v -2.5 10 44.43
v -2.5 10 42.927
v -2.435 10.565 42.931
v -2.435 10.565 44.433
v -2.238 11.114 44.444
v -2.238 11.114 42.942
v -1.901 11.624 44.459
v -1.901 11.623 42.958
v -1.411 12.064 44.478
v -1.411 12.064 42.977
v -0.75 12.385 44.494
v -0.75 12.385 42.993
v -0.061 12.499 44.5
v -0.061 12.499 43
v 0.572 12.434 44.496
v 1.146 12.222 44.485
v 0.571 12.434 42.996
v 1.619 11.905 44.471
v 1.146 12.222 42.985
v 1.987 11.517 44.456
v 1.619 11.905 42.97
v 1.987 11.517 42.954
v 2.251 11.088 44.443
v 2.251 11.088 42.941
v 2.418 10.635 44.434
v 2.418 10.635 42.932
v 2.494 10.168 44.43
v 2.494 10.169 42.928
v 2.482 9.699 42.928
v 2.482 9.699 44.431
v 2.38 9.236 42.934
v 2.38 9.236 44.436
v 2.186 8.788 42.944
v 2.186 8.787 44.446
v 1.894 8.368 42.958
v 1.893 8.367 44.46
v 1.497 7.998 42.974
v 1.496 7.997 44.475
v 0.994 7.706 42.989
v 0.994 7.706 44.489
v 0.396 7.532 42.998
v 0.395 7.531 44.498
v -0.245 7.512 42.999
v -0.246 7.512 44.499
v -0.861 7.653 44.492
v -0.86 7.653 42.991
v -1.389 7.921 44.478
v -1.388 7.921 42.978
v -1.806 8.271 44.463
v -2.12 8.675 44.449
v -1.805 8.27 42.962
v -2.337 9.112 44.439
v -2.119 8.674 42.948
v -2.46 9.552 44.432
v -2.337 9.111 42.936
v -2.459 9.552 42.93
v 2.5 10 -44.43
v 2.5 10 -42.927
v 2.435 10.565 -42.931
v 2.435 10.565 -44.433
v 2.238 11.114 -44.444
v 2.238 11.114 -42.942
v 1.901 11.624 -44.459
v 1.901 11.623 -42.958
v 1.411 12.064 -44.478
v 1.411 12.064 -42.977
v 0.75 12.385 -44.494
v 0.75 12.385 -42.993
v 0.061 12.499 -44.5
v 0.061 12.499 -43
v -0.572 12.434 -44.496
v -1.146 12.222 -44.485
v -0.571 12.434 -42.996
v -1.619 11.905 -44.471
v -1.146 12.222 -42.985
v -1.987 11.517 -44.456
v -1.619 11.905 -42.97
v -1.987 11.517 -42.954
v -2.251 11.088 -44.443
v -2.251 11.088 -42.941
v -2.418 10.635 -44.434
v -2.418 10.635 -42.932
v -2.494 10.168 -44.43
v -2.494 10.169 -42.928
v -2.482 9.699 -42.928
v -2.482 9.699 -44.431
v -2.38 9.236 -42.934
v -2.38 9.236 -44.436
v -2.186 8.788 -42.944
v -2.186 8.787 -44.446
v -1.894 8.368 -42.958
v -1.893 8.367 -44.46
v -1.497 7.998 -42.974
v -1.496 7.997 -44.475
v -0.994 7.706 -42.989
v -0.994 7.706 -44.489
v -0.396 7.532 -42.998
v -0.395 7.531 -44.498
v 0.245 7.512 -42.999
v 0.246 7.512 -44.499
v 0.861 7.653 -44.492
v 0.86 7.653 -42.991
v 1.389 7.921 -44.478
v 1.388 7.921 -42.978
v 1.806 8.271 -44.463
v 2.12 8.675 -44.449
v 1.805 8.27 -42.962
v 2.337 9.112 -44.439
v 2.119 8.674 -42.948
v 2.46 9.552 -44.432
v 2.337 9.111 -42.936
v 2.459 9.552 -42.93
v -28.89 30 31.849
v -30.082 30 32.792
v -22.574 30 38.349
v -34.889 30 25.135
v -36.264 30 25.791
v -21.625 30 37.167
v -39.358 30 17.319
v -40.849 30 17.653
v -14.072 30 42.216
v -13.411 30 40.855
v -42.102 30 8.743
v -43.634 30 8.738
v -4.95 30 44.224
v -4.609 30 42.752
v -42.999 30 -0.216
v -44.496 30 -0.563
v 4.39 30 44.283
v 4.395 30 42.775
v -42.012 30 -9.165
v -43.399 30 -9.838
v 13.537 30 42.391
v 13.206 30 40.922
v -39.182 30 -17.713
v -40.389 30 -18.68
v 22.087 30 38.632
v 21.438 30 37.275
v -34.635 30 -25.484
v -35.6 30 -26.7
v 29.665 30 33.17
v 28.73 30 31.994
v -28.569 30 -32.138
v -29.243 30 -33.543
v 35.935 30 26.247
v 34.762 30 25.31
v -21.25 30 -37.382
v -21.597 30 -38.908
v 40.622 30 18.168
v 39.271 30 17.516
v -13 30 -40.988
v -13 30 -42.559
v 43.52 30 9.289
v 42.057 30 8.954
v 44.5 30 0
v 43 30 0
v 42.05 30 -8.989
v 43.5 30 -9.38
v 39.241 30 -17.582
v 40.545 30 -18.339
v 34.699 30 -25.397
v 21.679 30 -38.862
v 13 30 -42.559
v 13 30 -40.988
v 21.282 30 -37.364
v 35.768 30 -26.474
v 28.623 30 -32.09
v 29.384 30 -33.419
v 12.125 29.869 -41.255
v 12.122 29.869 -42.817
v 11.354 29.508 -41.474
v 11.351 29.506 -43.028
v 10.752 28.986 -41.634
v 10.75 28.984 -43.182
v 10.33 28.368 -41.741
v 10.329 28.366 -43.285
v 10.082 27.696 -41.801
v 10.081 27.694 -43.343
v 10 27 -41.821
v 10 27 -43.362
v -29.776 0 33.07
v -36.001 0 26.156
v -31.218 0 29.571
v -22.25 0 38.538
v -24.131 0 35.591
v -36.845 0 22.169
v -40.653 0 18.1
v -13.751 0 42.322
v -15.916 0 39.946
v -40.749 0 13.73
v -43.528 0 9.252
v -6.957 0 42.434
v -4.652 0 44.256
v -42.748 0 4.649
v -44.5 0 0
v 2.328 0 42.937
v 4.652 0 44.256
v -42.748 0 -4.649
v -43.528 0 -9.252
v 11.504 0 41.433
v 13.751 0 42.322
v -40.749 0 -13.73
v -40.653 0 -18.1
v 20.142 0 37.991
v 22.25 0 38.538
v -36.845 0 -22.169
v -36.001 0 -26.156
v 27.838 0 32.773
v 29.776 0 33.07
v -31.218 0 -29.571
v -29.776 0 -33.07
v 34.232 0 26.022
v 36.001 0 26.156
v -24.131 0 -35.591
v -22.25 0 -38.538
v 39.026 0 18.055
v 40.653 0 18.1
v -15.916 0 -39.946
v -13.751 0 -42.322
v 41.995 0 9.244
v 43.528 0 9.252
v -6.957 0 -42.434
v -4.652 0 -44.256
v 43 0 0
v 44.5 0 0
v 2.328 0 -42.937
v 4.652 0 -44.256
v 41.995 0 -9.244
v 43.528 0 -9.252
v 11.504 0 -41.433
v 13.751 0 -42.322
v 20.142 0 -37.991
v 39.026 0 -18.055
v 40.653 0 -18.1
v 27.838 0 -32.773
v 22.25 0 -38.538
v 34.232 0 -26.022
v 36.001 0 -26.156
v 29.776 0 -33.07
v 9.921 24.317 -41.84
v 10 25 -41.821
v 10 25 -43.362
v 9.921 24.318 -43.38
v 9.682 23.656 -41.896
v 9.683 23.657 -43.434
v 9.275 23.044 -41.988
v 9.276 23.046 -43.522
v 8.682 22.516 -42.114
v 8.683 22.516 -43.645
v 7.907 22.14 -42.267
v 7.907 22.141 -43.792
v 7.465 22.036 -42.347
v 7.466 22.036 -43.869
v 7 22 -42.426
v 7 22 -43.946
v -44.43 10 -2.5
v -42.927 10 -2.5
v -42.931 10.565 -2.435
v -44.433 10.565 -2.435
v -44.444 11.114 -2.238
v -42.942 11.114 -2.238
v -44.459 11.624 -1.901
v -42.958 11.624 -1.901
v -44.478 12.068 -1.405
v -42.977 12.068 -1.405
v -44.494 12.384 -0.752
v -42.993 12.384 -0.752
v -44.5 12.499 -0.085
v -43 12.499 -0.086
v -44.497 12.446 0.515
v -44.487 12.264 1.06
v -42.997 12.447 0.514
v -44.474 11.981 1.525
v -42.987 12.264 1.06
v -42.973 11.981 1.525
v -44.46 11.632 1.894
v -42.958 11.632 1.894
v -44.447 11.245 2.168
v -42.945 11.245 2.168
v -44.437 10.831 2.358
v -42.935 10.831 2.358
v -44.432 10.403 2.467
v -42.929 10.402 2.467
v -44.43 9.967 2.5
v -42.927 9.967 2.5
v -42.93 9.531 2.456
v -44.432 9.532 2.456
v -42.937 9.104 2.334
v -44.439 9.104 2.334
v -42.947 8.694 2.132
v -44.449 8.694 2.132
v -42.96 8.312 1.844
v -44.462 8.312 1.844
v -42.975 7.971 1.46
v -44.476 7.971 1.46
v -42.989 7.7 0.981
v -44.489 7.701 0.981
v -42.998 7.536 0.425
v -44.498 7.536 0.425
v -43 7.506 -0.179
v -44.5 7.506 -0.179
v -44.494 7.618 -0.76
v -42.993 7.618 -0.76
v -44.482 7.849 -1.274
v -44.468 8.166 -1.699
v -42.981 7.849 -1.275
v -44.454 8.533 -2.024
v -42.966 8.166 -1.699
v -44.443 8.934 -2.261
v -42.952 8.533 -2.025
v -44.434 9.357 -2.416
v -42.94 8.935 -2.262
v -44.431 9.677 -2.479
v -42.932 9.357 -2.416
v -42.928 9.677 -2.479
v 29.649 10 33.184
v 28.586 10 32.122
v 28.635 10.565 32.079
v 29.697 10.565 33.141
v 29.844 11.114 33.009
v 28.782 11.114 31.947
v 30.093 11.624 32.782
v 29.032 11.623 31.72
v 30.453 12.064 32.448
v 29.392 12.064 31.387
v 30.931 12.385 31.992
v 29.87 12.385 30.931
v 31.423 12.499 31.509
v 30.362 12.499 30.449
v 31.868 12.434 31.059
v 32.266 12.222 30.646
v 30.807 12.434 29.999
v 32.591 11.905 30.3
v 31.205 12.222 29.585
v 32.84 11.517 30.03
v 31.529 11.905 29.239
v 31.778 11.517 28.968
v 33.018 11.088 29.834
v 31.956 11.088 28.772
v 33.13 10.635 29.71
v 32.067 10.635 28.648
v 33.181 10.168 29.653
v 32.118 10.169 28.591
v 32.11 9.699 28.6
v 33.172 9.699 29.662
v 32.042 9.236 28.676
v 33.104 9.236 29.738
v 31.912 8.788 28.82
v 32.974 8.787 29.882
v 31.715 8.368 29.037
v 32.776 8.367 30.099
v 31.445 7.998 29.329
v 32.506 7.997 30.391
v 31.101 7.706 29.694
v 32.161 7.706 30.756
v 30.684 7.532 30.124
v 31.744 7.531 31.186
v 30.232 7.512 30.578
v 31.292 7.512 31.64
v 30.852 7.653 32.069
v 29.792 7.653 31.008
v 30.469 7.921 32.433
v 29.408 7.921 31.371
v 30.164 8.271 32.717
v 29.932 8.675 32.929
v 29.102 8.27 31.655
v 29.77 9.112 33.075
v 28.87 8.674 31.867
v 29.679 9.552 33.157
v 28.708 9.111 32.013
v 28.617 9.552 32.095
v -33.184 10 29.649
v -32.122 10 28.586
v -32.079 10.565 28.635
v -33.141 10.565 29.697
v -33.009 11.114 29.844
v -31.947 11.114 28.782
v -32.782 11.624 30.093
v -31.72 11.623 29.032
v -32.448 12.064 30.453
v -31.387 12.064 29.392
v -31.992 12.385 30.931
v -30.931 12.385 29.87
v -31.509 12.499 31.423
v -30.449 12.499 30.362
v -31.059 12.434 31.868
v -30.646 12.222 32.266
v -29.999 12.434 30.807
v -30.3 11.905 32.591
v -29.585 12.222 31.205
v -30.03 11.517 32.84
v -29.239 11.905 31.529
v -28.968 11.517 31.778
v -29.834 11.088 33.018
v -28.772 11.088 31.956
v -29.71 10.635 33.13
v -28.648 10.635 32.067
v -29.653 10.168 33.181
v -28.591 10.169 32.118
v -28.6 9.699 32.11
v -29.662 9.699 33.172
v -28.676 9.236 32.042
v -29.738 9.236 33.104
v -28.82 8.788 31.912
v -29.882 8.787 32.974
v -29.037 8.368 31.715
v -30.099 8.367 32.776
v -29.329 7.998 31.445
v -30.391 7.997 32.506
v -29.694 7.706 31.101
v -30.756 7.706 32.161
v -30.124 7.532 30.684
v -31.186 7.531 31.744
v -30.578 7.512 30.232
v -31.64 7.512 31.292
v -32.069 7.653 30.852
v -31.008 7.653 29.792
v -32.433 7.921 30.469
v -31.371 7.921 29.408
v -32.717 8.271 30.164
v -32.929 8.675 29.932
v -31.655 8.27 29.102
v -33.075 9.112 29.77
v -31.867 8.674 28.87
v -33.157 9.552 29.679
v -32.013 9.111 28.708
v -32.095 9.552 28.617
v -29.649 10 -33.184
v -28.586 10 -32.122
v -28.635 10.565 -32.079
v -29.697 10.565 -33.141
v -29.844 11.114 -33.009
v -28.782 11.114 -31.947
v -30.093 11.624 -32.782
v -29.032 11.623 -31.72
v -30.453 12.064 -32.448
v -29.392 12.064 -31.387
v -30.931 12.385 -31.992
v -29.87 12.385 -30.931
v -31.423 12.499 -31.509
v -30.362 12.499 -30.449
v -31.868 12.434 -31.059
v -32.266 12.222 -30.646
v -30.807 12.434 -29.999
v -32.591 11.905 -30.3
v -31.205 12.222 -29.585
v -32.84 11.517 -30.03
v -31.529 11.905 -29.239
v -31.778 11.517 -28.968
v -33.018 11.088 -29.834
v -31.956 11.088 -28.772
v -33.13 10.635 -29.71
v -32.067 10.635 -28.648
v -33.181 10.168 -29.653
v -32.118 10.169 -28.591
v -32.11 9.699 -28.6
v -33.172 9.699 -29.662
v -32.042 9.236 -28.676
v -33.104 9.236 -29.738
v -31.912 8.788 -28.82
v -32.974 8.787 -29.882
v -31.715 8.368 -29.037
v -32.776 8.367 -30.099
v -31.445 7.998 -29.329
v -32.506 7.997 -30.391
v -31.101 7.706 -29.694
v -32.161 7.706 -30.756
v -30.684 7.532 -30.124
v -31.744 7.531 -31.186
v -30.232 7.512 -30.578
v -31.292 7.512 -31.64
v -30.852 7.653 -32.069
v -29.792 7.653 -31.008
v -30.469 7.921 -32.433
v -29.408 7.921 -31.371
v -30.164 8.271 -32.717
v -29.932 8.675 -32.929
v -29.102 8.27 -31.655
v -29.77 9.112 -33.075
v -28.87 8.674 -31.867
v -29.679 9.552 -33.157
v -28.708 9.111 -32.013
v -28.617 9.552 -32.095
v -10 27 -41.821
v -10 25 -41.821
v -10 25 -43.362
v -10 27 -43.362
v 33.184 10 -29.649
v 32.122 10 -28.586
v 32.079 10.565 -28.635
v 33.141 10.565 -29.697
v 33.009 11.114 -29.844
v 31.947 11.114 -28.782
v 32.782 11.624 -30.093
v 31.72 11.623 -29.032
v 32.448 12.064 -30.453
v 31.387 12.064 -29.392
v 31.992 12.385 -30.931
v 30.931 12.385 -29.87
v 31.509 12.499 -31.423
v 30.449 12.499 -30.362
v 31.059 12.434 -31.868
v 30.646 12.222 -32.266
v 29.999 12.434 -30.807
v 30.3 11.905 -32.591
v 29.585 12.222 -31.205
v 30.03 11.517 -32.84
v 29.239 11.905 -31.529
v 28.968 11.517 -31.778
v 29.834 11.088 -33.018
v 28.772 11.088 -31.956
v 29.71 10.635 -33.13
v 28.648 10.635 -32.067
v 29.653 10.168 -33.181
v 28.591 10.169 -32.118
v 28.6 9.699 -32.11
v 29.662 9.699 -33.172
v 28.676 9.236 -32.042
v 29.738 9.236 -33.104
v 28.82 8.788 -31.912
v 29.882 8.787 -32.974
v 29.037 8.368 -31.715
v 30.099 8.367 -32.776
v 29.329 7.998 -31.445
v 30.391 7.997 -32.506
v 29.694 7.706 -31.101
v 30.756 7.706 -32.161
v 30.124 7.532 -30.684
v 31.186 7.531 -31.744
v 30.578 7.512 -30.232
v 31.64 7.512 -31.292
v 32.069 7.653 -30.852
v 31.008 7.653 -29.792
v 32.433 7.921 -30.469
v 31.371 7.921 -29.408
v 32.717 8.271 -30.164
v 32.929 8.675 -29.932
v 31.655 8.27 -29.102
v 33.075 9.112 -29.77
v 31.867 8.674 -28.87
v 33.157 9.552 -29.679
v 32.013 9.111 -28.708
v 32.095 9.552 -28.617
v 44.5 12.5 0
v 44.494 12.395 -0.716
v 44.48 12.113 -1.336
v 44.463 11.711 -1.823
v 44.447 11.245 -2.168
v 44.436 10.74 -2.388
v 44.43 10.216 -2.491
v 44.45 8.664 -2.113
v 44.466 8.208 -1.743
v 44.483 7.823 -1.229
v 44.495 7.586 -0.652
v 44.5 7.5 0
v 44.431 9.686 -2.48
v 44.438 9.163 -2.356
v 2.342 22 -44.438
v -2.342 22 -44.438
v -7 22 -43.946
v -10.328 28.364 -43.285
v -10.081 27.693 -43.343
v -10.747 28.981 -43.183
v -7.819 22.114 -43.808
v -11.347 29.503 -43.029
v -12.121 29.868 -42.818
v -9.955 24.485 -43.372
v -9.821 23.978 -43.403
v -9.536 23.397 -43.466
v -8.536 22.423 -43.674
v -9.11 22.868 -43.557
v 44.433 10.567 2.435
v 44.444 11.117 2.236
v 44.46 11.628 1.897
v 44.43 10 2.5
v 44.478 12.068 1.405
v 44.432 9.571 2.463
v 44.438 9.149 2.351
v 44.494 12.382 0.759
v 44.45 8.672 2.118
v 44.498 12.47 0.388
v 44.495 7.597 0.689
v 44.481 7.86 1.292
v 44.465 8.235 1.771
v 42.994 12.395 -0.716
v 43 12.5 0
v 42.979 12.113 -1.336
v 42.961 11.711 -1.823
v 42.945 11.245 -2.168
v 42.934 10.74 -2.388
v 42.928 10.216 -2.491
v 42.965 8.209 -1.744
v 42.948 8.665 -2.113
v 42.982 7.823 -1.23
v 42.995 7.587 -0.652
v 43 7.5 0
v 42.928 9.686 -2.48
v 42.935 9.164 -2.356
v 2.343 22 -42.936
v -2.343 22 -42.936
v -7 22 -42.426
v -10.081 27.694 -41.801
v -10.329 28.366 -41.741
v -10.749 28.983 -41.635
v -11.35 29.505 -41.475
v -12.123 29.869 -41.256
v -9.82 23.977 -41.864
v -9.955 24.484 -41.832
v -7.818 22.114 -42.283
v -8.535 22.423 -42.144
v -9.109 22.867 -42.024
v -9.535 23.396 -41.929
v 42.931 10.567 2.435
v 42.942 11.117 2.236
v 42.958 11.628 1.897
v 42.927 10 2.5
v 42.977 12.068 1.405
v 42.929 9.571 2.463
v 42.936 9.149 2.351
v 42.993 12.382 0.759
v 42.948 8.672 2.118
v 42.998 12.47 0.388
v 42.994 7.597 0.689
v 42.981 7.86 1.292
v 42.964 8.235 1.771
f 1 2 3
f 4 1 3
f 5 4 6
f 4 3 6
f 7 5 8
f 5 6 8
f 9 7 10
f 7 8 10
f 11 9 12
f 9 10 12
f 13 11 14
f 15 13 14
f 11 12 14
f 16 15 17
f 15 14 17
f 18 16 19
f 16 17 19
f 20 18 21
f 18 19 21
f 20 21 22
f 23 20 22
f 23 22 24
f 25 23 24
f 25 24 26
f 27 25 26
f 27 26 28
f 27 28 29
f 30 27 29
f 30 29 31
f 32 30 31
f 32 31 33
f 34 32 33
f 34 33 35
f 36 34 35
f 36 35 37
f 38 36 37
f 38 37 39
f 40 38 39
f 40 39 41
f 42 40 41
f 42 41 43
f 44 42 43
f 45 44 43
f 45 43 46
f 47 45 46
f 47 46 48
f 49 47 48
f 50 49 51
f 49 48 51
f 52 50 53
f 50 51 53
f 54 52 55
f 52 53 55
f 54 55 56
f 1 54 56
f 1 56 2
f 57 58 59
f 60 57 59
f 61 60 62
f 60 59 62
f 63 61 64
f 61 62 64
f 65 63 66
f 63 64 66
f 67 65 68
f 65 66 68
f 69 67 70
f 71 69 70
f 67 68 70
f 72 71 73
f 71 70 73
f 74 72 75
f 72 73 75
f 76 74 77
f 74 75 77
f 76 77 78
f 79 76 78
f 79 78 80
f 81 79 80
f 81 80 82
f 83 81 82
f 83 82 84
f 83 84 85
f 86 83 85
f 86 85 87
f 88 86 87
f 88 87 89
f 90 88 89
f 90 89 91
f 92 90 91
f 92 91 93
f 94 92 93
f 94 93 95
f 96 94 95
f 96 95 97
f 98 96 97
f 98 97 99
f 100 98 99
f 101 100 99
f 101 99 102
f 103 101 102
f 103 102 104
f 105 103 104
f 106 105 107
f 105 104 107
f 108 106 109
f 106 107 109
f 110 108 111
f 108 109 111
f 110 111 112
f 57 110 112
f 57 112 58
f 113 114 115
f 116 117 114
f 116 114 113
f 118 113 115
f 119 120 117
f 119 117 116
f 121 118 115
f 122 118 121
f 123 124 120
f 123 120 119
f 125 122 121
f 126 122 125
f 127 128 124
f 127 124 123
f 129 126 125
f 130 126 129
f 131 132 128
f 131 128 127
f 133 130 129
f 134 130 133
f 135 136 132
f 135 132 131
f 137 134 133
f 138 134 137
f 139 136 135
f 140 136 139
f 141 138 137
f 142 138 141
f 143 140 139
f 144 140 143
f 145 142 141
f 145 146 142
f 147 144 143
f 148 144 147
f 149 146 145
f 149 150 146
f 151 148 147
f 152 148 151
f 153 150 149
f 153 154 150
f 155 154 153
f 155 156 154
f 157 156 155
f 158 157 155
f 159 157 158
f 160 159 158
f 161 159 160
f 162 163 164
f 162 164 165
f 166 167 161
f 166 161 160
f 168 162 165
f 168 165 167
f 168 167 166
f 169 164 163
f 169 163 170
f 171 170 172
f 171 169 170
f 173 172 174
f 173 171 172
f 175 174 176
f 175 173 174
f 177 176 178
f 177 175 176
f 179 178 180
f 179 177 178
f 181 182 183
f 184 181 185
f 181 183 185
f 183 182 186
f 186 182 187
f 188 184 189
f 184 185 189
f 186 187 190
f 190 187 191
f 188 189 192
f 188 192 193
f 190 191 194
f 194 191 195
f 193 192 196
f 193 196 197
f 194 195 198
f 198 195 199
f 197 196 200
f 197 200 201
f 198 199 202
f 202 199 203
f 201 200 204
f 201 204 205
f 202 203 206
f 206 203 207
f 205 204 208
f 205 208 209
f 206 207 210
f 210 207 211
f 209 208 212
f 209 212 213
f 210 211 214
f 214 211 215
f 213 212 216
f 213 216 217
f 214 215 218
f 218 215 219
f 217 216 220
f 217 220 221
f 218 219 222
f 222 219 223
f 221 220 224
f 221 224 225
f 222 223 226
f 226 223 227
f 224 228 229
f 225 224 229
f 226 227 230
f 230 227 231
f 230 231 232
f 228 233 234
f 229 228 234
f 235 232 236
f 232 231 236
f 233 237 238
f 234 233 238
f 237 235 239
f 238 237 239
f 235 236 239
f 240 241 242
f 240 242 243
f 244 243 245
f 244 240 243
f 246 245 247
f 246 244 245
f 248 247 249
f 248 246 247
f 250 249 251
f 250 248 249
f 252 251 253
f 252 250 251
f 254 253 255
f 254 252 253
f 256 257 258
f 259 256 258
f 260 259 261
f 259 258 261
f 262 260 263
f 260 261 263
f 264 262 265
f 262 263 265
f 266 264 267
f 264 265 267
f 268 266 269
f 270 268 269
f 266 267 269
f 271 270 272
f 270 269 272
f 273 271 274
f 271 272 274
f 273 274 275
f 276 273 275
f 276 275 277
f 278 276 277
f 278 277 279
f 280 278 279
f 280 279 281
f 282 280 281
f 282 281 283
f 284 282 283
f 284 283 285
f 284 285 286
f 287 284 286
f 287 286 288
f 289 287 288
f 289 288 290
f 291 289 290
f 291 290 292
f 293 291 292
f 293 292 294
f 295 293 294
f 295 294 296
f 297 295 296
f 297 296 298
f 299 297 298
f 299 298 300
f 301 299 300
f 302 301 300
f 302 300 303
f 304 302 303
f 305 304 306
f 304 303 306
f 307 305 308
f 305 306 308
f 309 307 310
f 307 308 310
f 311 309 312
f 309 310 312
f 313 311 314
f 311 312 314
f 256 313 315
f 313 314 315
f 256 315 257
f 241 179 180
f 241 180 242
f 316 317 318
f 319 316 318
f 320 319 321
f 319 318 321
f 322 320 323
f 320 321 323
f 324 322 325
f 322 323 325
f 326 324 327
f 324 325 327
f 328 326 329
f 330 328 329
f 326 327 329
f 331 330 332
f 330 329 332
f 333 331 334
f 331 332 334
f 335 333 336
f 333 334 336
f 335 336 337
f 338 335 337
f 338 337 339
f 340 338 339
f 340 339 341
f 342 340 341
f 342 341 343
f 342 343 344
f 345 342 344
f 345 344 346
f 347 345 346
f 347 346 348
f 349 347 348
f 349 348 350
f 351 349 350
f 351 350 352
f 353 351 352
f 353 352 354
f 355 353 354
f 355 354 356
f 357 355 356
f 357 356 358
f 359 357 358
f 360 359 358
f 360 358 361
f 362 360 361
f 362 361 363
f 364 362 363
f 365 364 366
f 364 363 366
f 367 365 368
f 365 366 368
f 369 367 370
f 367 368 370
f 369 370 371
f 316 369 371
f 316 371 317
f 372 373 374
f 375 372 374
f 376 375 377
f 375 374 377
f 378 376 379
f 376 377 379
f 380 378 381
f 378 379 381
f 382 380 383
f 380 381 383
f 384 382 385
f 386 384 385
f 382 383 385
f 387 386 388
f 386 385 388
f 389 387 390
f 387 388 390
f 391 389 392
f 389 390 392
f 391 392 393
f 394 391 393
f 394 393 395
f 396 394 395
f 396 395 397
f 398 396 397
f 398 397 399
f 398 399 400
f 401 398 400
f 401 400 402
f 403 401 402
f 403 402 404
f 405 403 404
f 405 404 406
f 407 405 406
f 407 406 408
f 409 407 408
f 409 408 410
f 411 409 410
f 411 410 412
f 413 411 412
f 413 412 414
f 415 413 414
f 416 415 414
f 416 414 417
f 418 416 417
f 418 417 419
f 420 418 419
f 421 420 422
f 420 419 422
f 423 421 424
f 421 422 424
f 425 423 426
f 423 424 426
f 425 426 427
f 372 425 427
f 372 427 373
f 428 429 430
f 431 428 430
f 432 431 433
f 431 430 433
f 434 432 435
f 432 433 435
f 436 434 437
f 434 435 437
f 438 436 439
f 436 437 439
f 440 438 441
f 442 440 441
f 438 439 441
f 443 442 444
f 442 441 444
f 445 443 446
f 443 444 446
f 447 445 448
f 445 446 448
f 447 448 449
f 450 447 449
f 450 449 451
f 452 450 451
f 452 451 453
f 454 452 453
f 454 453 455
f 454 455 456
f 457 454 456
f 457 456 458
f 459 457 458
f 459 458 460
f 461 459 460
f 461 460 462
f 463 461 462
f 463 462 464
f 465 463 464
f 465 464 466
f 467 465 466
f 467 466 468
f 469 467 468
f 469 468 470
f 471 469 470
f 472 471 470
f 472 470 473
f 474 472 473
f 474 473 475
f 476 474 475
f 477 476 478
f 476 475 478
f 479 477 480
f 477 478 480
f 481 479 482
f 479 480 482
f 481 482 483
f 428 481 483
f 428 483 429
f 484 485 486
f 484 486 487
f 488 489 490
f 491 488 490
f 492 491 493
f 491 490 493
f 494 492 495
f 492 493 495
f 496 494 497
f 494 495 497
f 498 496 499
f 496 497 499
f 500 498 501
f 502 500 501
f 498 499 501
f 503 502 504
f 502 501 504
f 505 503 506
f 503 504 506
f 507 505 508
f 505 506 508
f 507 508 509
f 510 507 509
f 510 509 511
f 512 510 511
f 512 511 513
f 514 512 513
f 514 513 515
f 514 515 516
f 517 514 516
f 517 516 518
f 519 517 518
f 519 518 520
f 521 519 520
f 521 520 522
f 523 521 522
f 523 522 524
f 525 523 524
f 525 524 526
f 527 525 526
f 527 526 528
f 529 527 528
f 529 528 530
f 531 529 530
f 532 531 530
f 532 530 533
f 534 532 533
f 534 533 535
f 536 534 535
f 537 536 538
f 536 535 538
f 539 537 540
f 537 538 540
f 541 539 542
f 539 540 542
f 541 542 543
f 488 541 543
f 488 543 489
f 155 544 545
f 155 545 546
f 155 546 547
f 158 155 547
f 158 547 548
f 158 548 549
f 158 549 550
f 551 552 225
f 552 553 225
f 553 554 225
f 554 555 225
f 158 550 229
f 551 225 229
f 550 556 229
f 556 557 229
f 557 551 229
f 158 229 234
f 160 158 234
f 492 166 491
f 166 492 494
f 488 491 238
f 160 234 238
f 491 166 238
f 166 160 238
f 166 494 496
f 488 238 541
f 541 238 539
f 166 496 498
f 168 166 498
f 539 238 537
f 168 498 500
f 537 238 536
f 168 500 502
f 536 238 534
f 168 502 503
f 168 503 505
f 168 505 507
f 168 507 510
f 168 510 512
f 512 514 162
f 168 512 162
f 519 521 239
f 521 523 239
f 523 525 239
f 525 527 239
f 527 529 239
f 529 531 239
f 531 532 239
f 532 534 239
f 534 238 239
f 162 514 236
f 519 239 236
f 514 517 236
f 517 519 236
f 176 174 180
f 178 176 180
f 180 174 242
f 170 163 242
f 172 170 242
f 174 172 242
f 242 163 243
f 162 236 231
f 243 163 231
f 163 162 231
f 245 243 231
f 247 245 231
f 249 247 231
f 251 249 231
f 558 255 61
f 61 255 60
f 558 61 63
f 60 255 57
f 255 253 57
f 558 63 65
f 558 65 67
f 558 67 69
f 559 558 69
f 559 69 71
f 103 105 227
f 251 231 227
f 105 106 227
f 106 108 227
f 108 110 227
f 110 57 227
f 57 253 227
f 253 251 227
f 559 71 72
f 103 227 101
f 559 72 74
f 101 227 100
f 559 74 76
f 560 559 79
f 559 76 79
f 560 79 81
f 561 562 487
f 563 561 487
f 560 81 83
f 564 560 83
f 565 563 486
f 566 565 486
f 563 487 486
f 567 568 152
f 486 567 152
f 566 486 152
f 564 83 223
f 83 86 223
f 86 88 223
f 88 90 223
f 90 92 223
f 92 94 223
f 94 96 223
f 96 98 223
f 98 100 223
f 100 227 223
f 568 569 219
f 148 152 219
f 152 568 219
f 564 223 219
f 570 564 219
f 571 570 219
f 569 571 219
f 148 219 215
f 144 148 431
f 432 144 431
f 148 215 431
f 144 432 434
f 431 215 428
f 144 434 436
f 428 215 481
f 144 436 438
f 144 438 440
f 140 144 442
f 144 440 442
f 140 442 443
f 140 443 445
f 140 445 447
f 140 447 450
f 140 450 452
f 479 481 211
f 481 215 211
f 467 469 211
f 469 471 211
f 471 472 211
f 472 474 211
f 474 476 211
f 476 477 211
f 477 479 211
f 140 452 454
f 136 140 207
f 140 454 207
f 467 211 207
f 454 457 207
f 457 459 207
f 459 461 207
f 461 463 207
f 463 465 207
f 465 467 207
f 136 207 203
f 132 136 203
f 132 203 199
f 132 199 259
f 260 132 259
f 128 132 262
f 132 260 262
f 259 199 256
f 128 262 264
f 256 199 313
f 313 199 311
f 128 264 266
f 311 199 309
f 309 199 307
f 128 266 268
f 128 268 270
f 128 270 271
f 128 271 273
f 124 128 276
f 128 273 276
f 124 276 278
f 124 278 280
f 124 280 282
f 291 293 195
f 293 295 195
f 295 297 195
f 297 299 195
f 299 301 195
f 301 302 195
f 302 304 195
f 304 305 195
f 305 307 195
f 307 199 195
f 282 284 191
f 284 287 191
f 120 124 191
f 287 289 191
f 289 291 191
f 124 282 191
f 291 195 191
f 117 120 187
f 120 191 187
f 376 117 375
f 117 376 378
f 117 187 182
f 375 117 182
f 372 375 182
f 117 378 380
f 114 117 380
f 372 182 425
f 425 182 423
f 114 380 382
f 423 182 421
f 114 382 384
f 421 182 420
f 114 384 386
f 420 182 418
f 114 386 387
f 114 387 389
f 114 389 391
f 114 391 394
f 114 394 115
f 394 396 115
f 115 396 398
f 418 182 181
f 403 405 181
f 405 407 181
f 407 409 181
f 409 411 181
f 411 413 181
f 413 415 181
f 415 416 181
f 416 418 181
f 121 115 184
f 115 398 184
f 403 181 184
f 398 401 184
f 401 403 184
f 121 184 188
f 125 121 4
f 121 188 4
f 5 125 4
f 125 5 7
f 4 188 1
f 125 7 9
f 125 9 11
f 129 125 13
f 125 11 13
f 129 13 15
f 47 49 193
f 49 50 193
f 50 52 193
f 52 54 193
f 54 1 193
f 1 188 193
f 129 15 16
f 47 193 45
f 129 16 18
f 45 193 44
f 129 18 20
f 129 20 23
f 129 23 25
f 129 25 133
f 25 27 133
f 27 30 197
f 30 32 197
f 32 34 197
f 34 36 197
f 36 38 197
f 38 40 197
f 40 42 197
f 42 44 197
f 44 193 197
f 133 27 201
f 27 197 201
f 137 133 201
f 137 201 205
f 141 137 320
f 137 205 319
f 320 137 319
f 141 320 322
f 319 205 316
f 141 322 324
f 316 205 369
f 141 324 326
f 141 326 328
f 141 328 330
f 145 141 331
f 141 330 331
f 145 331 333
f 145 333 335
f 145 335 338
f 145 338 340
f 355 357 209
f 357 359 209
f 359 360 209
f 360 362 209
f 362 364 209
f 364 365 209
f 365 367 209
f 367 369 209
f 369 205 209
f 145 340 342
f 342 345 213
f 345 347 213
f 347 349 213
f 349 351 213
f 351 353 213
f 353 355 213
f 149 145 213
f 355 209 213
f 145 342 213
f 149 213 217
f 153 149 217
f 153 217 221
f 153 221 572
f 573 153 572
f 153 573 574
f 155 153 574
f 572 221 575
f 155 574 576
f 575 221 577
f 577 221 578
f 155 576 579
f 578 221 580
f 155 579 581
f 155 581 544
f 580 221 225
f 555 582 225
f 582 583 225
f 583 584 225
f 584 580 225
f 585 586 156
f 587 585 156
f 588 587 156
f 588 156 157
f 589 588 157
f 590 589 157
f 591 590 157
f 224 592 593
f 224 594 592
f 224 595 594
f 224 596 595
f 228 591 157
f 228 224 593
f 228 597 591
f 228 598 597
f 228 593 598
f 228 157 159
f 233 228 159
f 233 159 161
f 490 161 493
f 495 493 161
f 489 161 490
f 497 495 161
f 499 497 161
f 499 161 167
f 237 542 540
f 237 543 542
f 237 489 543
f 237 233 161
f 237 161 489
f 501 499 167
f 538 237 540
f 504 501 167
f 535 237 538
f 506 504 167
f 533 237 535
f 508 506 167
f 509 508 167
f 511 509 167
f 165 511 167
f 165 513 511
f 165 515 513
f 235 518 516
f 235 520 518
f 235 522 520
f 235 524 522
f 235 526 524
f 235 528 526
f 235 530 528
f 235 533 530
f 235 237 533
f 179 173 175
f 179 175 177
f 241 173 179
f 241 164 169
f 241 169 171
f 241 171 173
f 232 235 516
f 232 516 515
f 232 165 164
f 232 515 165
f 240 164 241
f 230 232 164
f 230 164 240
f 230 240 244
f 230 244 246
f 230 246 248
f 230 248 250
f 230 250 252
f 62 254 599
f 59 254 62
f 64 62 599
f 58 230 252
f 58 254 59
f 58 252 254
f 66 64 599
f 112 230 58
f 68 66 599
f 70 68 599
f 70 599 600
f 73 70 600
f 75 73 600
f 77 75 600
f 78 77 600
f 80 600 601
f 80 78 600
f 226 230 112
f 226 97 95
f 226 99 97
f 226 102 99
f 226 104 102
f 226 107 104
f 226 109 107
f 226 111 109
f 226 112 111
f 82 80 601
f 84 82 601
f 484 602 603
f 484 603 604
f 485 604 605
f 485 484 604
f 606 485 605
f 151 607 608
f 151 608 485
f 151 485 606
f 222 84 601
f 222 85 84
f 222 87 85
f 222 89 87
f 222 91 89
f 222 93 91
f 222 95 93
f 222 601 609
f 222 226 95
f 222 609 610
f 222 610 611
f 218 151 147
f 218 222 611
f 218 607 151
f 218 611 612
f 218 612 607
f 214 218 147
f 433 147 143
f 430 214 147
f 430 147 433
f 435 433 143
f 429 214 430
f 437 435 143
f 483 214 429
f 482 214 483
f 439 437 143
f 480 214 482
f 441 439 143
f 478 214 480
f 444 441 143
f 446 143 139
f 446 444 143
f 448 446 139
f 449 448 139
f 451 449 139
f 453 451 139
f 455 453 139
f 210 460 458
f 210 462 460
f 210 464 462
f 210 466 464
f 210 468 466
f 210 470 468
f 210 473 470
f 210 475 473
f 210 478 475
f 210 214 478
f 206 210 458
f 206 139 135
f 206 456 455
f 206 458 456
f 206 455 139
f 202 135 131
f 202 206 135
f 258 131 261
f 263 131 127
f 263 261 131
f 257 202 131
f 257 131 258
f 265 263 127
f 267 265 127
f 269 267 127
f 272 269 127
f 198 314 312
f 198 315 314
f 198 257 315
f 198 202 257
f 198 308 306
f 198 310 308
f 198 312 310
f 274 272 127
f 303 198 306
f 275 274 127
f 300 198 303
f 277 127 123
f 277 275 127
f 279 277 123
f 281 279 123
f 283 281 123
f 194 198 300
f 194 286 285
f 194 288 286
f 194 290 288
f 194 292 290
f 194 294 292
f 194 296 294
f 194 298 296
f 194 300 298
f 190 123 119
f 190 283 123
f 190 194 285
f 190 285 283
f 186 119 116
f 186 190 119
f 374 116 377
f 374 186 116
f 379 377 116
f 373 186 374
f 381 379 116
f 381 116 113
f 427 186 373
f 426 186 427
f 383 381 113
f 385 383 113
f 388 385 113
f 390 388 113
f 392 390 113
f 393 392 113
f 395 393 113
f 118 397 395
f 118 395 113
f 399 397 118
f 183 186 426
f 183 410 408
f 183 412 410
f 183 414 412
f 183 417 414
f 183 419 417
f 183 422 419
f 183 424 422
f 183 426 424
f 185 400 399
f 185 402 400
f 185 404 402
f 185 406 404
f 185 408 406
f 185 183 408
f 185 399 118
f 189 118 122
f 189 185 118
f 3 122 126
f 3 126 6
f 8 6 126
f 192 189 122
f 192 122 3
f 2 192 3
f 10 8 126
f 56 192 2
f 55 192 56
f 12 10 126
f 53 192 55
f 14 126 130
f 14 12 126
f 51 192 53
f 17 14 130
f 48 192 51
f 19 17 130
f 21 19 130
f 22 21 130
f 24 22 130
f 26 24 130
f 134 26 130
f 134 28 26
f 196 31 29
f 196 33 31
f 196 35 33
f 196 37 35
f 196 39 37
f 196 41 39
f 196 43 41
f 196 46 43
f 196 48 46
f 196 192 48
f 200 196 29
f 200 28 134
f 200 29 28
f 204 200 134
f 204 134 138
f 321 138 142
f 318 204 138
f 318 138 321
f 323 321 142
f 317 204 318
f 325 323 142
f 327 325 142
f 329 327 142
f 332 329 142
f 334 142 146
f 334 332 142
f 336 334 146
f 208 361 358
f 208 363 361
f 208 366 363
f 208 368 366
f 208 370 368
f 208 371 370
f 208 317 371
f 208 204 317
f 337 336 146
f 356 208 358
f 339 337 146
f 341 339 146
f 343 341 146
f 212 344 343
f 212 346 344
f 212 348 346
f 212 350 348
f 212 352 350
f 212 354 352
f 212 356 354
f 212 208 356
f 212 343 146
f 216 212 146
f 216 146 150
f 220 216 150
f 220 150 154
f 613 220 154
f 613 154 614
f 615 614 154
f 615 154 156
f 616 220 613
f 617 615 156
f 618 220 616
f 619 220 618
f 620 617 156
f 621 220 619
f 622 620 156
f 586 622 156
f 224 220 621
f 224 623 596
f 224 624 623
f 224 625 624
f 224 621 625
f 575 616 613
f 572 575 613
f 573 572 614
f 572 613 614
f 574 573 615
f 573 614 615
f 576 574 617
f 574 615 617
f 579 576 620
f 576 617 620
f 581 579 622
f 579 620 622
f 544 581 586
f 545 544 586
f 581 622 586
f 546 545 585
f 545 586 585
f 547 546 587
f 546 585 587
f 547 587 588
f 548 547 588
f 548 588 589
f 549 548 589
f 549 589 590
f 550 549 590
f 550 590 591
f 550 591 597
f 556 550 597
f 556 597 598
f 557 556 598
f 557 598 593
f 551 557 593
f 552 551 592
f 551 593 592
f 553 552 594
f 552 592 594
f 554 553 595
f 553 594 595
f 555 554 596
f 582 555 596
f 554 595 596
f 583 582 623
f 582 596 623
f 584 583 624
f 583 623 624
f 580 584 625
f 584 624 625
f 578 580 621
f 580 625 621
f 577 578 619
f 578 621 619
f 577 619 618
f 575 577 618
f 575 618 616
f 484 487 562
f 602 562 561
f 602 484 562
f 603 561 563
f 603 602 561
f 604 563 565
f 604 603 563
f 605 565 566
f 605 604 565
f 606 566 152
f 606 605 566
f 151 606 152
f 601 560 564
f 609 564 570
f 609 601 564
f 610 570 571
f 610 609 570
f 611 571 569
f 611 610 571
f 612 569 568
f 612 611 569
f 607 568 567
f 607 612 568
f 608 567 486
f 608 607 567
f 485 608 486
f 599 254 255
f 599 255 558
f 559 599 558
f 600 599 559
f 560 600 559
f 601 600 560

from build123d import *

# Parameters (mm, degrees)
SKIZZE1_R                       = 44.5
SKIZZE1_R_2                     = 43
AUFSATZ_LINEAR_AUSTRAGEN1_DEPTH = 30
SKIZZE3_R                       = 2.5
SCHNITT_LINEAR_AUSTRAGEN1_DEPTH = 45.5
KREISMUSTER1_COUNT              = 8
SCHNITT_LINEAR_AUSTRAGEN2_DEPTH = 45.500000122


with BuildPart() as part:
    # Skizze1 → Aufsatz-Linear austragen1 (new body)
    with BuildSketch(Plane(origin=(0, 0, 0), x_dir=(1, 0, 0), z_dir=(0, 1, 0))):
        Circle(SKIZZE1_R)
        Circle(SKIZZE1_R_2, mode=Mode.SUBTRACT)
    extrude(amount=AUFSATZ_LINEAR_AUSTRAGEN1_DEPTH)

    # Skizze3 → Schnitt-Linear austragen1 (cut, through all)
    with BuildSketch(Plane.XY):
        with Locations((0, 10)):
            Circle(SKIZZE3_R)
    schnitt_linear_austragen1 = extrude(amount=-SCHNITT_LINEAR_AUSTRAGEN1_DEPTH, mode=Mode.SUBTRACT)

    # Kreismuster1: Schnitt-Linear austragen1 ×8 about axis
    kreismuster1_axis = Axis((0, 30, 0), (0, -1, 0))
    for i in range(1, KREISMUSTER1_COUNT):
        add(schnitt_linear_austragen1.rotate(kreismuster1_axis, i * 360 / KREISMUSTER1_COUNT), mode=Mode.SUBTRACT)

    # Skizze4 → Schnitt-Linear austragen2 (cut, through all)
    with BuildSketch(Plane.XY):
        with BuildLine():
            Line((-13, 30), (13, 30))
            ThreePointArc((13, 30), (10.878679656, 29.121320344), (10, 27))
            Line((10, 27), (10, 25))
            ThreePointArc((10, 25), (9.121320344, 22.878679656), (7, 22))
            Line((7, 22), (-7, 22))
            ThreePointArc((-7, 22), (-9.121320344, 22.878679656), (-10, 25))
            Line((-10, 25), (-10, 27))
            ThreePointArc((-10, 27), (-10.878679656, 29.121320344), (-13, 30))
        make_face()
    extrude(amount=-SCHNITT_LINEAR_AUSTRAGEN2_DEPTH, mode=Mode.SUBTRACT)


solid = part.part
